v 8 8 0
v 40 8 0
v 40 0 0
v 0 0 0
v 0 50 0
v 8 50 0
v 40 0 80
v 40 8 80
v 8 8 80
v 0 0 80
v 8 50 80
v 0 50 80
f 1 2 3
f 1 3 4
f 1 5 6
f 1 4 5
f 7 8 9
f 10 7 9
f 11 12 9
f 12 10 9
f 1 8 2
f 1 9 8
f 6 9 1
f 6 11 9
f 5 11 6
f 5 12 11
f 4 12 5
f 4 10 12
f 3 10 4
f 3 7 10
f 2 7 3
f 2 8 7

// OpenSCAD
$fn = 32;

// ----------------------------------------------------------------------
// Structural section: angle 40 x 50 mm
// ----------------------------------------------------------------------

// --- parameters (mm) ---
sec_w = 40;               // leg width, X
sec_h = 50;               // leg height, Y
flange_t = 8;             // leg thickness
plate_t = 80;             // cut length, Z (extrusion height)

profile = [[0, 0], [40, 0], [40, 8], [8, 8], [8, 50], [0, 50]];  // primary outline, 6 points, counter clockwise

// --- the one profile operation ---
linear_extrude(height = plate_t) polygon(points = profile);
